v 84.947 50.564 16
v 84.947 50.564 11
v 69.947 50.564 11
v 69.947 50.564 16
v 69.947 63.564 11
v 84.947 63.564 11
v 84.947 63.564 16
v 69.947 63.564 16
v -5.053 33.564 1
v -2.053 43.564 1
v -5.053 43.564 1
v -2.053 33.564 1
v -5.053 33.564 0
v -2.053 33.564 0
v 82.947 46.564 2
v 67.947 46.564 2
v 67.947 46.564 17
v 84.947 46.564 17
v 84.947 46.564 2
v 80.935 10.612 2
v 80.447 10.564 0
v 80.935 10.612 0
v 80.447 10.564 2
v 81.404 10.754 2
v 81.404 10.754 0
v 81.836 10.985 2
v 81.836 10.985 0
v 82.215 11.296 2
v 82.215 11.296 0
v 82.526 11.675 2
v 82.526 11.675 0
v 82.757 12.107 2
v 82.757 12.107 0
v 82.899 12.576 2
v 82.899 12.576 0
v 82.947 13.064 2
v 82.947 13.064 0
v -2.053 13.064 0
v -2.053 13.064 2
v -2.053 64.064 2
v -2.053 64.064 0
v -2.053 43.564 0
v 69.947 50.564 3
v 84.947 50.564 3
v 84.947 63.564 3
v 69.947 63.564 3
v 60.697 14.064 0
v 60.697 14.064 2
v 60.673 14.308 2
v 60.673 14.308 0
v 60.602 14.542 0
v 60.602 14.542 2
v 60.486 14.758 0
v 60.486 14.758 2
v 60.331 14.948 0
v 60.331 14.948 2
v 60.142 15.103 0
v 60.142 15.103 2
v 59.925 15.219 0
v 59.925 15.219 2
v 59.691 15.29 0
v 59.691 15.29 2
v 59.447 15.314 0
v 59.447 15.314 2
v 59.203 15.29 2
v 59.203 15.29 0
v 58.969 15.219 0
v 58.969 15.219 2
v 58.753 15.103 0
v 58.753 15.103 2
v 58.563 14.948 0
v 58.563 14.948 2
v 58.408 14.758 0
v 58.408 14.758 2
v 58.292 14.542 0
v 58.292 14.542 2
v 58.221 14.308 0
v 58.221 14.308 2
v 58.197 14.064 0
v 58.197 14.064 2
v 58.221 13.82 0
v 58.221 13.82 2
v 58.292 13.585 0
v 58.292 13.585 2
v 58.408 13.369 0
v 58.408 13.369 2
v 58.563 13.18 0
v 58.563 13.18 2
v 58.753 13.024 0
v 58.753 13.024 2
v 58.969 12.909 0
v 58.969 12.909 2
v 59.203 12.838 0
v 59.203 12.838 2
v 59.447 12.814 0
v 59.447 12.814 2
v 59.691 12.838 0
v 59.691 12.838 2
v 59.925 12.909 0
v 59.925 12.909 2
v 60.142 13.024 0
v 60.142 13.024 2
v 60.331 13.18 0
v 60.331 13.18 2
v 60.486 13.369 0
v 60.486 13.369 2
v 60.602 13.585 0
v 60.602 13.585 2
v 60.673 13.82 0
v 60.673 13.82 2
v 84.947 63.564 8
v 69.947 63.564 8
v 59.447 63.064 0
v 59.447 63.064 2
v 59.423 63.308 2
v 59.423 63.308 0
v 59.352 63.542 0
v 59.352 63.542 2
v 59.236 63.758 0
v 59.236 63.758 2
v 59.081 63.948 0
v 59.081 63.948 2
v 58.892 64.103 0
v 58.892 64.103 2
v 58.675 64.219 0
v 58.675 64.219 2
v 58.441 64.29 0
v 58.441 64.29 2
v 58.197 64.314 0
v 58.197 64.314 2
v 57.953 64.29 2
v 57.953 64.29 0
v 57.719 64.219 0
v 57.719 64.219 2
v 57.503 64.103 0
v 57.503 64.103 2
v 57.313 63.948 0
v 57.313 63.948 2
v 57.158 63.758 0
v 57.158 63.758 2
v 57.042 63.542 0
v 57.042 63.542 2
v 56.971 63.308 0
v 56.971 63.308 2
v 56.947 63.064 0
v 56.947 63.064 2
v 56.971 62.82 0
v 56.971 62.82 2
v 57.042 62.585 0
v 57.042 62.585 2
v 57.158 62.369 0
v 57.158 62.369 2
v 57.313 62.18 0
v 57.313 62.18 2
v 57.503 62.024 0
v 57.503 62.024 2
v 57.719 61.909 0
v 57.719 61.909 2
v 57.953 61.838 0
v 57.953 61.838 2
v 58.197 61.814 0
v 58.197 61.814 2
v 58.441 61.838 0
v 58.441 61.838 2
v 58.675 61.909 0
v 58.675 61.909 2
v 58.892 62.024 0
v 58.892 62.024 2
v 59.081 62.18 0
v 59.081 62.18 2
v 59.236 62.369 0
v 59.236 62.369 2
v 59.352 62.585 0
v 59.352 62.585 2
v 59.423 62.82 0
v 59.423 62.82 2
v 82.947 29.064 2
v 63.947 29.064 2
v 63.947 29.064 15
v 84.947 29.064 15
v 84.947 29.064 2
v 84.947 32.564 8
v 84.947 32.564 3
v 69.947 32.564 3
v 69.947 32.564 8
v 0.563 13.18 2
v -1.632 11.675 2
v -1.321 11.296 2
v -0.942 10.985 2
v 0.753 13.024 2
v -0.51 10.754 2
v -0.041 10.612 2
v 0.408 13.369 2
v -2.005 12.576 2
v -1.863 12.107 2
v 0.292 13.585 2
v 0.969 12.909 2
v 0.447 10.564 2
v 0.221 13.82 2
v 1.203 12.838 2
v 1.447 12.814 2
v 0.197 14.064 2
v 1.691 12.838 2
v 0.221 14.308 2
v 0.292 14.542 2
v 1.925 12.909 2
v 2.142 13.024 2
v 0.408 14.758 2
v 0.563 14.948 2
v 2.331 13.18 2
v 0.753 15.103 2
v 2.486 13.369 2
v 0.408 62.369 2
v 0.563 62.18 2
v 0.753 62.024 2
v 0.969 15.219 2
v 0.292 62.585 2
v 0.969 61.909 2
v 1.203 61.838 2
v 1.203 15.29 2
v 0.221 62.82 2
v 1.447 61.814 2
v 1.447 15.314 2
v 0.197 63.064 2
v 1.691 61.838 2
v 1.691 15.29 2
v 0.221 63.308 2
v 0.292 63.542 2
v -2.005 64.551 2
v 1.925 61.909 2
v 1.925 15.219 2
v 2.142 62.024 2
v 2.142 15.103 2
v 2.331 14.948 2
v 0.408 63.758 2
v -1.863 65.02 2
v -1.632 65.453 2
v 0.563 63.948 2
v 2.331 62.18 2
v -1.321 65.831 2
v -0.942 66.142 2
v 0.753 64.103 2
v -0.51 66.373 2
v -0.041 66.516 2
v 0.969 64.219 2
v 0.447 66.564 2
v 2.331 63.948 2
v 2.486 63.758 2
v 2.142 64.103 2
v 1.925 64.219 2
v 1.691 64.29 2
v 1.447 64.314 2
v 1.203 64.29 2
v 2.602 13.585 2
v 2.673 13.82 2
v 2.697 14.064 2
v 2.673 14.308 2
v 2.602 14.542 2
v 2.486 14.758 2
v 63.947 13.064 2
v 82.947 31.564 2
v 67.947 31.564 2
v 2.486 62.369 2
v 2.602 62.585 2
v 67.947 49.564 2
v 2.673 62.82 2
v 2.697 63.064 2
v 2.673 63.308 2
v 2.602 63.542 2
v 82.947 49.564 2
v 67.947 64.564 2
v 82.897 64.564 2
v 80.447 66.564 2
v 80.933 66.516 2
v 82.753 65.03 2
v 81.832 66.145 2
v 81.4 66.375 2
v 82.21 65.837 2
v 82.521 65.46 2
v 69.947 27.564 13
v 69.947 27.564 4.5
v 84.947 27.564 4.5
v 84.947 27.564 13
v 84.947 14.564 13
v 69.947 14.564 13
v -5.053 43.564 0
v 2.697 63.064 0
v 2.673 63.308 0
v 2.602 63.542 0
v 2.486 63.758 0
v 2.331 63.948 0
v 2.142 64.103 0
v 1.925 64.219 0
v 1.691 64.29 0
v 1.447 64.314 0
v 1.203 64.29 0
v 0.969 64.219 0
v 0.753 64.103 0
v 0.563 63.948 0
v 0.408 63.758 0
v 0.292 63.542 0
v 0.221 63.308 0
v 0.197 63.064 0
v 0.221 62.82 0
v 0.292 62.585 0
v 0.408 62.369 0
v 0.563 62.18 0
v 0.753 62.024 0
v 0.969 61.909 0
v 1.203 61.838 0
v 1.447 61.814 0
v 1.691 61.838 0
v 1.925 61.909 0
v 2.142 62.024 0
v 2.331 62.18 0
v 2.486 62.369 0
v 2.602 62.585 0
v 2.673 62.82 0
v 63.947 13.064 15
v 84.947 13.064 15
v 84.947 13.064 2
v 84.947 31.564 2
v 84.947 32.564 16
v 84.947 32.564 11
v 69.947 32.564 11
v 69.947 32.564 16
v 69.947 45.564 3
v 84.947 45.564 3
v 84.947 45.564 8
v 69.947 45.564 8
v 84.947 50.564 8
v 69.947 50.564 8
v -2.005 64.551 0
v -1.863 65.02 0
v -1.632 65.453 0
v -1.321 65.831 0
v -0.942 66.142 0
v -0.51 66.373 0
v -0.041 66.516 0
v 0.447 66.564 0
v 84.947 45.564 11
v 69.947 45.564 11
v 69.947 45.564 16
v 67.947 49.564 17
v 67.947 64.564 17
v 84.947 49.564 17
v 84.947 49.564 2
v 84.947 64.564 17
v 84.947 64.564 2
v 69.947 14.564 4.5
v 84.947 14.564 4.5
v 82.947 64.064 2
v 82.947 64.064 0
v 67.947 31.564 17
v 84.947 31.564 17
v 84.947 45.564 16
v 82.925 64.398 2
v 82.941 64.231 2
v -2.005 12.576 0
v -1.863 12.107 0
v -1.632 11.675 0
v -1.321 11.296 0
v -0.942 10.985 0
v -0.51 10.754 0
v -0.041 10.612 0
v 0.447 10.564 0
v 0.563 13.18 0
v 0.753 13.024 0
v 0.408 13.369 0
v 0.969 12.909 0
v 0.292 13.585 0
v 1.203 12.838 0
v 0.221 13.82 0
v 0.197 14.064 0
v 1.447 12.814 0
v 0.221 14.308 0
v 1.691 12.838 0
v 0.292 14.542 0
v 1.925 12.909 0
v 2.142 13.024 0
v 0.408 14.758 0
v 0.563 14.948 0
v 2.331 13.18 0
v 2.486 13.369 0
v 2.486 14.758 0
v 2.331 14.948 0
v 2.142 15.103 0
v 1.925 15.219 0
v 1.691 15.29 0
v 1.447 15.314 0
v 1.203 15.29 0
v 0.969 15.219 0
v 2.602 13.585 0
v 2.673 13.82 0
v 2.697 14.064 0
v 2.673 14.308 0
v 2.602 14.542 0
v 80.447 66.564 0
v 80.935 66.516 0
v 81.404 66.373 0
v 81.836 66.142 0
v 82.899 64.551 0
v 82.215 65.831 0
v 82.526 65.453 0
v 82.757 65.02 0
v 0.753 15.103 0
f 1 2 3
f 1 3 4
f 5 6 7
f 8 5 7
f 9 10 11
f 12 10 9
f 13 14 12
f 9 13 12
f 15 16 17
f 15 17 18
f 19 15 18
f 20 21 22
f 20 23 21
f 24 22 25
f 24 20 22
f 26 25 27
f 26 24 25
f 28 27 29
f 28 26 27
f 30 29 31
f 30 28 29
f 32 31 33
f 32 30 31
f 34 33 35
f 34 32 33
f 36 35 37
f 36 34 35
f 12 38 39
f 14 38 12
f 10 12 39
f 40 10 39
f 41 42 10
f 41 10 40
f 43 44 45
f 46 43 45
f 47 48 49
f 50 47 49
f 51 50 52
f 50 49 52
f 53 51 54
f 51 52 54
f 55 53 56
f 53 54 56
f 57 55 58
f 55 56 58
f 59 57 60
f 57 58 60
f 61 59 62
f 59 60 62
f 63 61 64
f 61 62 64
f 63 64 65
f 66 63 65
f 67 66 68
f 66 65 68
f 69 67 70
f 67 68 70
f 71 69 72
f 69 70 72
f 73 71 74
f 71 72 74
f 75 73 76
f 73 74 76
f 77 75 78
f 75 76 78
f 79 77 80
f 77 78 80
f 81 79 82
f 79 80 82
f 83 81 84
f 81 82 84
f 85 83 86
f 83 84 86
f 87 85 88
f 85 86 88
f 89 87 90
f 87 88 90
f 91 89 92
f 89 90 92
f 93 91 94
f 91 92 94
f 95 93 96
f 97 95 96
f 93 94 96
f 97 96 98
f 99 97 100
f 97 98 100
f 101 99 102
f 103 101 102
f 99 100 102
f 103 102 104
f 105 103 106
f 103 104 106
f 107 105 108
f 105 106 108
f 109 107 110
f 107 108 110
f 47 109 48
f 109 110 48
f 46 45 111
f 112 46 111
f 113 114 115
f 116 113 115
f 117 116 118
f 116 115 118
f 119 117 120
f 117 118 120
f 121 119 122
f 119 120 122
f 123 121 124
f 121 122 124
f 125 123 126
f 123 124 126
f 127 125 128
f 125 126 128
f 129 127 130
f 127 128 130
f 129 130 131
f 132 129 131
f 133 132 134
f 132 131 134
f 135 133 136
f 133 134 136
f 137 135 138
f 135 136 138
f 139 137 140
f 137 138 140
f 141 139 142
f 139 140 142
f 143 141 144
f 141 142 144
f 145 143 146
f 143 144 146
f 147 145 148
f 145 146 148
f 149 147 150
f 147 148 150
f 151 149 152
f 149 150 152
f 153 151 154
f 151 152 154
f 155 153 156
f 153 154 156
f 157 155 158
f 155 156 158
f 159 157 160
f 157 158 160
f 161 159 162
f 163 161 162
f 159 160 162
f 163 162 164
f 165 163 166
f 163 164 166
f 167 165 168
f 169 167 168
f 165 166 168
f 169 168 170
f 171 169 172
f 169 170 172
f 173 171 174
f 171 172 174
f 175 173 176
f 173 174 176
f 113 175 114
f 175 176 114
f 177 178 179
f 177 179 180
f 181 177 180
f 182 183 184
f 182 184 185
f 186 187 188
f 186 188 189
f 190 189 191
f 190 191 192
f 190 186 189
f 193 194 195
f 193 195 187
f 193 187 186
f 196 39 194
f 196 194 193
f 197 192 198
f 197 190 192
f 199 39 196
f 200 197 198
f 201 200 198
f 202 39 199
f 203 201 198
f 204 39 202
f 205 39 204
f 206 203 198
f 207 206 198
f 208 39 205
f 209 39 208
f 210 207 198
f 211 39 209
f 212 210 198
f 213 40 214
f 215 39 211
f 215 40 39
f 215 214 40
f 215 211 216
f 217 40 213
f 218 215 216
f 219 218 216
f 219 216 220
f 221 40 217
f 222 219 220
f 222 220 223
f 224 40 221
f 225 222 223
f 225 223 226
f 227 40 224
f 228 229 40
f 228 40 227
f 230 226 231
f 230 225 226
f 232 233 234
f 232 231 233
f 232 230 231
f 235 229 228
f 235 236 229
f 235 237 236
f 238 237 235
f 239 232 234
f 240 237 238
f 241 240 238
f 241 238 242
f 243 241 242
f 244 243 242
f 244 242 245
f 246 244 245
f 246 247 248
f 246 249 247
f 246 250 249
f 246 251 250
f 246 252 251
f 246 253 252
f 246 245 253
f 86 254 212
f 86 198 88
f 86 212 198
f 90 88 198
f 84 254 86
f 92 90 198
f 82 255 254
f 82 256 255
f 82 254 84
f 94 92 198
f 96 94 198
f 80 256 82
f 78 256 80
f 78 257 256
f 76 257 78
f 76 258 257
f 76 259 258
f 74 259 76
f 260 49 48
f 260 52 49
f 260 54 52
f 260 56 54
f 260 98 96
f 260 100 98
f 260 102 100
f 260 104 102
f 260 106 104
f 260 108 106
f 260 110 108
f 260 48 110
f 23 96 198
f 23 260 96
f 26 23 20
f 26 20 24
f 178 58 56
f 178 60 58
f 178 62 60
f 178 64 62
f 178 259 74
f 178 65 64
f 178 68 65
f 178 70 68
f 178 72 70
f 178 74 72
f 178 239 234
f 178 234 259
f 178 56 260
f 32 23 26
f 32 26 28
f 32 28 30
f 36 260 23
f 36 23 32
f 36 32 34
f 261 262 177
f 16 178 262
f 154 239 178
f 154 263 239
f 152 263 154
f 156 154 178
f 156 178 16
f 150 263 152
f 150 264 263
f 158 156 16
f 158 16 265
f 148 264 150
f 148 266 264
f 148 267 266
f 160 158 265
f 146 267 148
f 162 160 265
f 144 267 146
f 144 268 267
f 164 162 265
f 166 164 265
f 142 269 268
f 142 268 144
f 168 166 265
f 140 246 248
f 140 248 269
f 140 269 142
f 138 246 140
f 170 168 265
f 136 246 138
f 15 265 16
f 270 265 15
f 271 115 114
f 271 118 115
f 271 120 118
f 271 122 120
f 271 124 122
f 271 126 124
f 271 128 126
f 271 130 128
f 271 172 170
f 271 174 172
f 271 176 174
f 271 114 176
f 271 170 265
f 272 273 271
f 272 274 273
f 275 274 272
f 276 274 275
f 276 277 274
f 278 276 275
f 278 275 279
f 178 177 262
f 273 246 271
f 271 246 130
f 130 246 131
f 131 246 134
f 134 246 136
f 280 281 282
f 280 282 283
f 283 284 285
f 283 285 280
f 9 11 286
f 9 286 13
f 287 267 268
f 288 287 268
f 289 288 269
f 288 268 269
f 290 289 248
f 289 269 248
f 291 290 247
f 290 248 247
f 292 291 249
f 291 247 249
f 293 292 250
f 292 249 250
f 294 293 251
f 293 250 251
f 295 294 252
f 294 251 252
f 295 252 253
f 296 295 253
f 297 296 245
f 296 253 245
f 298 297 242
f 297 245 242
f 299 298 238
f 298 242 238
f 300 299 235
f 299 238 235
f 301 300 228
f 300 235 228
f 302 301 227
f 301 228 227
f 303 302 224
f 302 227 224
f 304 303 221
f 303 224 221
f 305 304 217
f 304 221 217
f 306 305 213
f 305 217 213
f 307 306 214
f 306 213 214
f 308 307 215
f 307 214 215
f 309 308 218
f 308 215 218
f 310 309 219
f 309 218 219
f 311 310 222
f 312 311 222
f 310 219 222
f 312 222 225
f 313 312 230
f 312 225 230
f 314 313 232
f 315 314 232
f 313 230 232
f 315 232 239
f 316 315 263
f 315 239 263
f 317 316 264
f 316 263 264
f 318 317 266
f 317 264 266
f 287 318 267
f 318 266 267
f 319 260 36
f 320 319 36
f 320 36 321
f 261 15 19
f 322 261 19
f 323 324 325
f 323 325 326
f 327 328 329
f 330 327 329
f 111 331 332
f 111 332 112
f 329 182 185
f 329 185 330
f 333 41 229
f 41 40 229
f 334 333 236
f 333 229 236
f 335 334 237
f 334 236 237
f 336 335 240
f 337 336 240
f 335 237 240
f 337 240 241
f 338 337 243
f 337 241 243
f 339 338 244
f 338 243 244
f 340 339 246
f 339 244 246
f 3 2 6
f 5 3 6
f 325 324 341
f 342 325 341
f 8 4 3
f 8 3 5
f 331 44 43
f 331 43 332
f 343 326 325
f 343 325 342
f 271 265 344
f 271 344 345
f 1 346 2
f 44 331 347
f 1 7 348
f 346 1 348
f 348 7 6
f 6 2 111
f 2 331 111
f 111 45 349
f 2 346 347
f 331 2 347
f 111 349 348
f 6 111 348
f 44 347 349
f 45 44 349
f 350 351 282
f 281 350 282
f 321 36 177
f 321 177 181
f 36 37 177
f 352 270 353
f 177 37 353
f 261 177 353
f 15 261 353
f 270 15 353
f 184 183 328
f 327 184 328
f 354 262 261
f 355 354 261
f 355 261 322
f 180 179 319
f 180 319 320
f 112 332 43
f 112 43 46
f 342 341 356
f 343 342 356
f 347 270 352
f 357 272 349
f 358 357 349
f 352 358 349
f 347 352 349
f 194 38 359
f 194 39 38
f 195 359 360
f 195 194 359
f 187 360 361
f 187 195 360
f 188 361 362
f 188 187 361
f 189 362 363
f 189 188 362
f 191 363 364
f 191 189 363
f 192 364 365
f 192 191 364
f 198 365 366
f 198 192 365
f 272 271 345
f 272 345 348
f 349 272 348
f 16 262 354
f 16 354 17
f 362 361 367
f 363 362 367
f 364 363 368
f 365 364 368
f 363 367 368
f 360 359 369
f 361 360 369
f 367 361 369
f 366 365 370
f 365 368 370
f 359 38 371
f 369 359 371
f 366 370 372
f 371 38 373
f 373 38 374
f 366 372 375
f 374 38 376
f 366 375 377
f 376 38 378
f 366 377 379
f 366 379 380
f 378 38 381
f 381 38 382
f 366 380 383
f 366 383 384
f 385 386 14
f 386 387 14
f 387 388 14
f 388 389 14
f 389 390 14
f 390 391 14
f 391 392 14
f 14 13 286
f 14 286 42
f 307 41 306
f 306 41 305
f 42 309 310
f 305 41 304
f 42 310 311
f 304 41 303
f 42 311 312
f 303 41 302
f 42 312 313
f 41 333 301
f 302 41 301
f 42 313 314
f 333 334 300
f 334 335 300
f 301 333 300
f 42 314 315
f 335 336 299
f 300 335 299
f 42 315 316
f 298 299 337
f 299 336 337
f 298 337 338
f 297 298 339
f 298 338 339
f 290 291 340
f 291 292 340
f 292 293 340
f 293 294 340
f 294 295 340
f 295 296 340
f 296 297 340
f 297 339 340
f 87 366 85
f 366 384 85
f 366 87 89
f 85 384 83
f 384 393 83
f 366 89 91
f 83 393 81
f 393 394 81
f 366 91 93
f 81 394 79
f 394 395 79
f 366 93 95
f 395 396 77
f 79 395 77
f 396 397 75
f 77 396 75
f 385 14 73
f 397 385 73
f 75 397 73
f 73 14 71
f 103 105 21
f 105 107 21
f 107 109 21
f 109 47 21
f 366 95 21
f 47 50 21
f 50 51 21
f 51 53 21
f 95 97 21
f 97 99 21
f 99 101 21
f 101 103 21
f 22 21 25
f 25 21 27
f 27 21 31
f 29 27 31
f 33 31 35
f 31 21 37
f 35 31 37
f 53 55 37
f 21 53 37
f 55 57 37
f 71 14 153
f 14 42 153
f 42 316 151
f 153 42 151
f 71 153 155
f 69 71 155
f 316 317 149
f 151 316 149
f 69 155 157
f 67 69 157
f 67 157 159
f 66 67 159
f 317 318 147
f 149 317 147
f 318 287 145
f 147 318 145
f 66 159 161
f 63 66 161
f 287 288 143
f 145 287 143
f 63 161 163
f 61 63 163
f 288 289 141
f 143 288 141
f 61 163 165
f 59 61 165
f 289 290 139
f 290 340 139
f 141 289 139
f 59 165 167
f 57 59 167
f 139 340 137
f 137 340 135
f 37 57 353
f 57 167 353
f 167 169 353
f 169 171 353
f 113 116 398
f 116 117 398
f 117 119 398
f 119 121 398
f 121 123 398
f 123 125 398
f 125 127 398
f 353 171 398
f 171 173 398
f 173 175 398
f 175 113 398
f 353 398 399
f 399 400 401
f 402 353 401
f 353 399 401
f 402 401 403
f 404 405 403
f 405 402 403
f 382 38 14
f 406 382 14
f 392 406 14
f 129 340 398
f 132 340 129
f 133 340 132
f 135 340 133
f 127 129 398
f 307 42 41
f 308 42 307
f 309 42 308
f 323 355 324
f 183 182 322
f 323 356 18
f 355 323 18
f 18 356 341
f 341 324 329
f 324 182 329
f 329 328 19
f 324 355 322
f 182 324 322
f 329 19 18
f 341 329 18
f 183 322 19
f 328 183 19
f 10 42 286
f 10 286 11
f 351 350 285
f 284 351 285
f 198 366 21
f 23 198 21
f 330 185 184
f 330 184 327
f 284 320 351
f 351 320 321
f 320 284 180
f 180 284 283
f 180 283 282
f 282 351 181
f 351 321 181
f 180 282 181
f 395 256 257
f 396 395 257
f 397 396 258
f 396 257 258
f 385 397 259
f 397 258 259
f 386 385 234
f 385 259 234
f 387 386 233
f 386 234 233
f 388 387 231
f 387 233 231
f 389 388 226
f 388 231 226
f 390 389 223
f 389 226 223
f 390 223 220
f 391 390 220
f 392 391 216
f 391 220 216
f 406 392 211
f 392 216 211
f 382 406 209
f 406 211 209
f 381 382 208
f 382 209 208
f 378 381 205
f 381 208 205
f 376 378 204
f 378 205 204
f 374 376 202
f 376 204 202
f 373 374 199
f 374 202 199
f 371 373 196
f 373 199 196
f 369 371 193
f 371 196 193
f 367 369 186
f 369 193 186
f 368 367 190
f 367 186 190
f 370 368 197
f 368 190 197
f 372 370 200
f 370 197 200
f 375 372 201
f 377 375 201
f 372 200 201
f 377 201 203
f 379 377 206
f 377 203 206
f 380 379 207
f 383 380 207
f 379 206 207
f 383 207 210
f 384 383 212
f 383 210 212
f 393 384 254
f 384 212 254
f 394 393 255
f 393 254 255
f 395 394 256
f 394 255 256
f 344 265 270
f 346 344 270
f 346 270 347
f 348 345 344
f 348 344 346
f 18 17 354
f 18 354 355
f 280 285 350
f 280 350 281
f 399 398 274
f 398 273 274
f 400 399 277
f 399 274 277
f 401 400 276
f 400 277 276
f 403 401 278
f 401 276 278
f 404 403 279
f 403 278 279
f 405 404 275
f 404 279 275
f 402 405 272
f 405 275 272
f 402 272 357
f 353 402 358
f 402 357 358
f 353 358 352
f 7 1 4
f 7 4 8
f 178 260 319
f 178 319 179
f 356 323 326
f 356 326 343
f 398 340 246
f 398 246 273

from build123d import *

# Parameters (mm, degrees)
F0_W      = 85
F0_H      = 56
F1_DEPTH  = 2
F2_R      = 1.25
F3_DEPTH  = 2
F4_R      = 2.5
F5_W      = 17
F5_H      = 15
F6_DEPTH  = 15
F7_W      = 13
F7_H      = 5
F8_DEPTH  = 15
F9_W      = 21
F9_H      = 16
F10_DEPTH = 13
F11_W     = 13
F11_H     = 8.5
F12_DEPTH = 15
F13_W     = 10
F13_H     = 1
F14_DEPTH = 3


with BuildPart() as f1:
    # F0 (on Top) → F1 (new body)
    with BuildSketch(Plane.XY):
        with Locations((40.44705, 38.563722)):
            Rectangle(F0_W, F0_H)
    extrude(amount=F1_DEPTH)

    # F2 (on face) → F3 (cut, through all)
    with BuildSketch(Plane.XY.offset(2)):
        with Locations((1.44705, 63.063722)):
            Circle(F2_R)
        with Locations((1.44705, 14.063722)):
            Circle(F2_R)
        with Locations((58.19705, 63.063722)):
            Circle(F2_R)
        with Locations((59.44705, 14.063722)):
            Circle(F2_R)
    extrude(amount=-F3_DEPTH, mode=Mode.SUBTRACT)

    # F4
    f4_edges = [f1.edges().sort_by_distance(p)[0] for p in [
        (82.94705, 10.563722, 1),
        (82.94705, 66.563722, 1),
        (-2.05295, 10.563722, 1),
        (-2.05295, 66.563722, 1),
    ]]
    fillet(f4_edges, radius=F4_R)

    # F5 (on face) → F6 (join)
    with BuildSketch(Plane.XY.offset(2)):
        with Locations((76.44705, 57.063722)):
            Rectangle(F5_W, F5_H)
        with Locations((76.44705, 39.063722)):
            Rectangle(F5_W, F5_H)
    extrude(amount=F6_DEPTH)

    # F7 (on face) → F8 (cut)
    with BuildSketch(Plane.YZ.offset(84.94705)):
        with Locations((39.063722, 13.5)):
            Rectangle(F7_W, F7_H)
        with Locations((39.063722, 5.5)):
            Rectangle(F7_W, F7_H)
        with Locations((57.063722, 13.5)):
            Rectangle(F7_W, F7_H)
        with Locations((57.063722, 5.5)):
            Rectangle(F7_W, F7_H)
    extrude(amount=-F8_DEPTH, mode=Mode.SUBTRACT)

    # F9 (on face) → F10 (join)
    with BuildSketch(Plane.XY.offset(2)):
        with Locations((74.44705, 21.063722)):
            Rectangle(F9_W, F9_H)
    extrude(amount=F10_DEPTH)

    # F11 (on face) → F12 (cut)
    with BuildSketch(Plane.YZ.offset(84.94705)):
        with Locations((21.063722, 8.75)):
            Rectangle(F11_W, F11_H)
    extrude(amount=-F12_DEPTH, mode=Mode.SUBTRACT)

    # F13 (on face) → F14 (join)
    with BuildSketch(Plane(origin=(-2.05295, 0, 0), x_dir=(0, -1, 0), z_dir=(-1, 0, 0))):
        with Locations((-38.563722, 0.5)):
            Rectangle(F13_W, F13_H)
    extrude(amount=F14_DEPTH)


solid = f1.part
